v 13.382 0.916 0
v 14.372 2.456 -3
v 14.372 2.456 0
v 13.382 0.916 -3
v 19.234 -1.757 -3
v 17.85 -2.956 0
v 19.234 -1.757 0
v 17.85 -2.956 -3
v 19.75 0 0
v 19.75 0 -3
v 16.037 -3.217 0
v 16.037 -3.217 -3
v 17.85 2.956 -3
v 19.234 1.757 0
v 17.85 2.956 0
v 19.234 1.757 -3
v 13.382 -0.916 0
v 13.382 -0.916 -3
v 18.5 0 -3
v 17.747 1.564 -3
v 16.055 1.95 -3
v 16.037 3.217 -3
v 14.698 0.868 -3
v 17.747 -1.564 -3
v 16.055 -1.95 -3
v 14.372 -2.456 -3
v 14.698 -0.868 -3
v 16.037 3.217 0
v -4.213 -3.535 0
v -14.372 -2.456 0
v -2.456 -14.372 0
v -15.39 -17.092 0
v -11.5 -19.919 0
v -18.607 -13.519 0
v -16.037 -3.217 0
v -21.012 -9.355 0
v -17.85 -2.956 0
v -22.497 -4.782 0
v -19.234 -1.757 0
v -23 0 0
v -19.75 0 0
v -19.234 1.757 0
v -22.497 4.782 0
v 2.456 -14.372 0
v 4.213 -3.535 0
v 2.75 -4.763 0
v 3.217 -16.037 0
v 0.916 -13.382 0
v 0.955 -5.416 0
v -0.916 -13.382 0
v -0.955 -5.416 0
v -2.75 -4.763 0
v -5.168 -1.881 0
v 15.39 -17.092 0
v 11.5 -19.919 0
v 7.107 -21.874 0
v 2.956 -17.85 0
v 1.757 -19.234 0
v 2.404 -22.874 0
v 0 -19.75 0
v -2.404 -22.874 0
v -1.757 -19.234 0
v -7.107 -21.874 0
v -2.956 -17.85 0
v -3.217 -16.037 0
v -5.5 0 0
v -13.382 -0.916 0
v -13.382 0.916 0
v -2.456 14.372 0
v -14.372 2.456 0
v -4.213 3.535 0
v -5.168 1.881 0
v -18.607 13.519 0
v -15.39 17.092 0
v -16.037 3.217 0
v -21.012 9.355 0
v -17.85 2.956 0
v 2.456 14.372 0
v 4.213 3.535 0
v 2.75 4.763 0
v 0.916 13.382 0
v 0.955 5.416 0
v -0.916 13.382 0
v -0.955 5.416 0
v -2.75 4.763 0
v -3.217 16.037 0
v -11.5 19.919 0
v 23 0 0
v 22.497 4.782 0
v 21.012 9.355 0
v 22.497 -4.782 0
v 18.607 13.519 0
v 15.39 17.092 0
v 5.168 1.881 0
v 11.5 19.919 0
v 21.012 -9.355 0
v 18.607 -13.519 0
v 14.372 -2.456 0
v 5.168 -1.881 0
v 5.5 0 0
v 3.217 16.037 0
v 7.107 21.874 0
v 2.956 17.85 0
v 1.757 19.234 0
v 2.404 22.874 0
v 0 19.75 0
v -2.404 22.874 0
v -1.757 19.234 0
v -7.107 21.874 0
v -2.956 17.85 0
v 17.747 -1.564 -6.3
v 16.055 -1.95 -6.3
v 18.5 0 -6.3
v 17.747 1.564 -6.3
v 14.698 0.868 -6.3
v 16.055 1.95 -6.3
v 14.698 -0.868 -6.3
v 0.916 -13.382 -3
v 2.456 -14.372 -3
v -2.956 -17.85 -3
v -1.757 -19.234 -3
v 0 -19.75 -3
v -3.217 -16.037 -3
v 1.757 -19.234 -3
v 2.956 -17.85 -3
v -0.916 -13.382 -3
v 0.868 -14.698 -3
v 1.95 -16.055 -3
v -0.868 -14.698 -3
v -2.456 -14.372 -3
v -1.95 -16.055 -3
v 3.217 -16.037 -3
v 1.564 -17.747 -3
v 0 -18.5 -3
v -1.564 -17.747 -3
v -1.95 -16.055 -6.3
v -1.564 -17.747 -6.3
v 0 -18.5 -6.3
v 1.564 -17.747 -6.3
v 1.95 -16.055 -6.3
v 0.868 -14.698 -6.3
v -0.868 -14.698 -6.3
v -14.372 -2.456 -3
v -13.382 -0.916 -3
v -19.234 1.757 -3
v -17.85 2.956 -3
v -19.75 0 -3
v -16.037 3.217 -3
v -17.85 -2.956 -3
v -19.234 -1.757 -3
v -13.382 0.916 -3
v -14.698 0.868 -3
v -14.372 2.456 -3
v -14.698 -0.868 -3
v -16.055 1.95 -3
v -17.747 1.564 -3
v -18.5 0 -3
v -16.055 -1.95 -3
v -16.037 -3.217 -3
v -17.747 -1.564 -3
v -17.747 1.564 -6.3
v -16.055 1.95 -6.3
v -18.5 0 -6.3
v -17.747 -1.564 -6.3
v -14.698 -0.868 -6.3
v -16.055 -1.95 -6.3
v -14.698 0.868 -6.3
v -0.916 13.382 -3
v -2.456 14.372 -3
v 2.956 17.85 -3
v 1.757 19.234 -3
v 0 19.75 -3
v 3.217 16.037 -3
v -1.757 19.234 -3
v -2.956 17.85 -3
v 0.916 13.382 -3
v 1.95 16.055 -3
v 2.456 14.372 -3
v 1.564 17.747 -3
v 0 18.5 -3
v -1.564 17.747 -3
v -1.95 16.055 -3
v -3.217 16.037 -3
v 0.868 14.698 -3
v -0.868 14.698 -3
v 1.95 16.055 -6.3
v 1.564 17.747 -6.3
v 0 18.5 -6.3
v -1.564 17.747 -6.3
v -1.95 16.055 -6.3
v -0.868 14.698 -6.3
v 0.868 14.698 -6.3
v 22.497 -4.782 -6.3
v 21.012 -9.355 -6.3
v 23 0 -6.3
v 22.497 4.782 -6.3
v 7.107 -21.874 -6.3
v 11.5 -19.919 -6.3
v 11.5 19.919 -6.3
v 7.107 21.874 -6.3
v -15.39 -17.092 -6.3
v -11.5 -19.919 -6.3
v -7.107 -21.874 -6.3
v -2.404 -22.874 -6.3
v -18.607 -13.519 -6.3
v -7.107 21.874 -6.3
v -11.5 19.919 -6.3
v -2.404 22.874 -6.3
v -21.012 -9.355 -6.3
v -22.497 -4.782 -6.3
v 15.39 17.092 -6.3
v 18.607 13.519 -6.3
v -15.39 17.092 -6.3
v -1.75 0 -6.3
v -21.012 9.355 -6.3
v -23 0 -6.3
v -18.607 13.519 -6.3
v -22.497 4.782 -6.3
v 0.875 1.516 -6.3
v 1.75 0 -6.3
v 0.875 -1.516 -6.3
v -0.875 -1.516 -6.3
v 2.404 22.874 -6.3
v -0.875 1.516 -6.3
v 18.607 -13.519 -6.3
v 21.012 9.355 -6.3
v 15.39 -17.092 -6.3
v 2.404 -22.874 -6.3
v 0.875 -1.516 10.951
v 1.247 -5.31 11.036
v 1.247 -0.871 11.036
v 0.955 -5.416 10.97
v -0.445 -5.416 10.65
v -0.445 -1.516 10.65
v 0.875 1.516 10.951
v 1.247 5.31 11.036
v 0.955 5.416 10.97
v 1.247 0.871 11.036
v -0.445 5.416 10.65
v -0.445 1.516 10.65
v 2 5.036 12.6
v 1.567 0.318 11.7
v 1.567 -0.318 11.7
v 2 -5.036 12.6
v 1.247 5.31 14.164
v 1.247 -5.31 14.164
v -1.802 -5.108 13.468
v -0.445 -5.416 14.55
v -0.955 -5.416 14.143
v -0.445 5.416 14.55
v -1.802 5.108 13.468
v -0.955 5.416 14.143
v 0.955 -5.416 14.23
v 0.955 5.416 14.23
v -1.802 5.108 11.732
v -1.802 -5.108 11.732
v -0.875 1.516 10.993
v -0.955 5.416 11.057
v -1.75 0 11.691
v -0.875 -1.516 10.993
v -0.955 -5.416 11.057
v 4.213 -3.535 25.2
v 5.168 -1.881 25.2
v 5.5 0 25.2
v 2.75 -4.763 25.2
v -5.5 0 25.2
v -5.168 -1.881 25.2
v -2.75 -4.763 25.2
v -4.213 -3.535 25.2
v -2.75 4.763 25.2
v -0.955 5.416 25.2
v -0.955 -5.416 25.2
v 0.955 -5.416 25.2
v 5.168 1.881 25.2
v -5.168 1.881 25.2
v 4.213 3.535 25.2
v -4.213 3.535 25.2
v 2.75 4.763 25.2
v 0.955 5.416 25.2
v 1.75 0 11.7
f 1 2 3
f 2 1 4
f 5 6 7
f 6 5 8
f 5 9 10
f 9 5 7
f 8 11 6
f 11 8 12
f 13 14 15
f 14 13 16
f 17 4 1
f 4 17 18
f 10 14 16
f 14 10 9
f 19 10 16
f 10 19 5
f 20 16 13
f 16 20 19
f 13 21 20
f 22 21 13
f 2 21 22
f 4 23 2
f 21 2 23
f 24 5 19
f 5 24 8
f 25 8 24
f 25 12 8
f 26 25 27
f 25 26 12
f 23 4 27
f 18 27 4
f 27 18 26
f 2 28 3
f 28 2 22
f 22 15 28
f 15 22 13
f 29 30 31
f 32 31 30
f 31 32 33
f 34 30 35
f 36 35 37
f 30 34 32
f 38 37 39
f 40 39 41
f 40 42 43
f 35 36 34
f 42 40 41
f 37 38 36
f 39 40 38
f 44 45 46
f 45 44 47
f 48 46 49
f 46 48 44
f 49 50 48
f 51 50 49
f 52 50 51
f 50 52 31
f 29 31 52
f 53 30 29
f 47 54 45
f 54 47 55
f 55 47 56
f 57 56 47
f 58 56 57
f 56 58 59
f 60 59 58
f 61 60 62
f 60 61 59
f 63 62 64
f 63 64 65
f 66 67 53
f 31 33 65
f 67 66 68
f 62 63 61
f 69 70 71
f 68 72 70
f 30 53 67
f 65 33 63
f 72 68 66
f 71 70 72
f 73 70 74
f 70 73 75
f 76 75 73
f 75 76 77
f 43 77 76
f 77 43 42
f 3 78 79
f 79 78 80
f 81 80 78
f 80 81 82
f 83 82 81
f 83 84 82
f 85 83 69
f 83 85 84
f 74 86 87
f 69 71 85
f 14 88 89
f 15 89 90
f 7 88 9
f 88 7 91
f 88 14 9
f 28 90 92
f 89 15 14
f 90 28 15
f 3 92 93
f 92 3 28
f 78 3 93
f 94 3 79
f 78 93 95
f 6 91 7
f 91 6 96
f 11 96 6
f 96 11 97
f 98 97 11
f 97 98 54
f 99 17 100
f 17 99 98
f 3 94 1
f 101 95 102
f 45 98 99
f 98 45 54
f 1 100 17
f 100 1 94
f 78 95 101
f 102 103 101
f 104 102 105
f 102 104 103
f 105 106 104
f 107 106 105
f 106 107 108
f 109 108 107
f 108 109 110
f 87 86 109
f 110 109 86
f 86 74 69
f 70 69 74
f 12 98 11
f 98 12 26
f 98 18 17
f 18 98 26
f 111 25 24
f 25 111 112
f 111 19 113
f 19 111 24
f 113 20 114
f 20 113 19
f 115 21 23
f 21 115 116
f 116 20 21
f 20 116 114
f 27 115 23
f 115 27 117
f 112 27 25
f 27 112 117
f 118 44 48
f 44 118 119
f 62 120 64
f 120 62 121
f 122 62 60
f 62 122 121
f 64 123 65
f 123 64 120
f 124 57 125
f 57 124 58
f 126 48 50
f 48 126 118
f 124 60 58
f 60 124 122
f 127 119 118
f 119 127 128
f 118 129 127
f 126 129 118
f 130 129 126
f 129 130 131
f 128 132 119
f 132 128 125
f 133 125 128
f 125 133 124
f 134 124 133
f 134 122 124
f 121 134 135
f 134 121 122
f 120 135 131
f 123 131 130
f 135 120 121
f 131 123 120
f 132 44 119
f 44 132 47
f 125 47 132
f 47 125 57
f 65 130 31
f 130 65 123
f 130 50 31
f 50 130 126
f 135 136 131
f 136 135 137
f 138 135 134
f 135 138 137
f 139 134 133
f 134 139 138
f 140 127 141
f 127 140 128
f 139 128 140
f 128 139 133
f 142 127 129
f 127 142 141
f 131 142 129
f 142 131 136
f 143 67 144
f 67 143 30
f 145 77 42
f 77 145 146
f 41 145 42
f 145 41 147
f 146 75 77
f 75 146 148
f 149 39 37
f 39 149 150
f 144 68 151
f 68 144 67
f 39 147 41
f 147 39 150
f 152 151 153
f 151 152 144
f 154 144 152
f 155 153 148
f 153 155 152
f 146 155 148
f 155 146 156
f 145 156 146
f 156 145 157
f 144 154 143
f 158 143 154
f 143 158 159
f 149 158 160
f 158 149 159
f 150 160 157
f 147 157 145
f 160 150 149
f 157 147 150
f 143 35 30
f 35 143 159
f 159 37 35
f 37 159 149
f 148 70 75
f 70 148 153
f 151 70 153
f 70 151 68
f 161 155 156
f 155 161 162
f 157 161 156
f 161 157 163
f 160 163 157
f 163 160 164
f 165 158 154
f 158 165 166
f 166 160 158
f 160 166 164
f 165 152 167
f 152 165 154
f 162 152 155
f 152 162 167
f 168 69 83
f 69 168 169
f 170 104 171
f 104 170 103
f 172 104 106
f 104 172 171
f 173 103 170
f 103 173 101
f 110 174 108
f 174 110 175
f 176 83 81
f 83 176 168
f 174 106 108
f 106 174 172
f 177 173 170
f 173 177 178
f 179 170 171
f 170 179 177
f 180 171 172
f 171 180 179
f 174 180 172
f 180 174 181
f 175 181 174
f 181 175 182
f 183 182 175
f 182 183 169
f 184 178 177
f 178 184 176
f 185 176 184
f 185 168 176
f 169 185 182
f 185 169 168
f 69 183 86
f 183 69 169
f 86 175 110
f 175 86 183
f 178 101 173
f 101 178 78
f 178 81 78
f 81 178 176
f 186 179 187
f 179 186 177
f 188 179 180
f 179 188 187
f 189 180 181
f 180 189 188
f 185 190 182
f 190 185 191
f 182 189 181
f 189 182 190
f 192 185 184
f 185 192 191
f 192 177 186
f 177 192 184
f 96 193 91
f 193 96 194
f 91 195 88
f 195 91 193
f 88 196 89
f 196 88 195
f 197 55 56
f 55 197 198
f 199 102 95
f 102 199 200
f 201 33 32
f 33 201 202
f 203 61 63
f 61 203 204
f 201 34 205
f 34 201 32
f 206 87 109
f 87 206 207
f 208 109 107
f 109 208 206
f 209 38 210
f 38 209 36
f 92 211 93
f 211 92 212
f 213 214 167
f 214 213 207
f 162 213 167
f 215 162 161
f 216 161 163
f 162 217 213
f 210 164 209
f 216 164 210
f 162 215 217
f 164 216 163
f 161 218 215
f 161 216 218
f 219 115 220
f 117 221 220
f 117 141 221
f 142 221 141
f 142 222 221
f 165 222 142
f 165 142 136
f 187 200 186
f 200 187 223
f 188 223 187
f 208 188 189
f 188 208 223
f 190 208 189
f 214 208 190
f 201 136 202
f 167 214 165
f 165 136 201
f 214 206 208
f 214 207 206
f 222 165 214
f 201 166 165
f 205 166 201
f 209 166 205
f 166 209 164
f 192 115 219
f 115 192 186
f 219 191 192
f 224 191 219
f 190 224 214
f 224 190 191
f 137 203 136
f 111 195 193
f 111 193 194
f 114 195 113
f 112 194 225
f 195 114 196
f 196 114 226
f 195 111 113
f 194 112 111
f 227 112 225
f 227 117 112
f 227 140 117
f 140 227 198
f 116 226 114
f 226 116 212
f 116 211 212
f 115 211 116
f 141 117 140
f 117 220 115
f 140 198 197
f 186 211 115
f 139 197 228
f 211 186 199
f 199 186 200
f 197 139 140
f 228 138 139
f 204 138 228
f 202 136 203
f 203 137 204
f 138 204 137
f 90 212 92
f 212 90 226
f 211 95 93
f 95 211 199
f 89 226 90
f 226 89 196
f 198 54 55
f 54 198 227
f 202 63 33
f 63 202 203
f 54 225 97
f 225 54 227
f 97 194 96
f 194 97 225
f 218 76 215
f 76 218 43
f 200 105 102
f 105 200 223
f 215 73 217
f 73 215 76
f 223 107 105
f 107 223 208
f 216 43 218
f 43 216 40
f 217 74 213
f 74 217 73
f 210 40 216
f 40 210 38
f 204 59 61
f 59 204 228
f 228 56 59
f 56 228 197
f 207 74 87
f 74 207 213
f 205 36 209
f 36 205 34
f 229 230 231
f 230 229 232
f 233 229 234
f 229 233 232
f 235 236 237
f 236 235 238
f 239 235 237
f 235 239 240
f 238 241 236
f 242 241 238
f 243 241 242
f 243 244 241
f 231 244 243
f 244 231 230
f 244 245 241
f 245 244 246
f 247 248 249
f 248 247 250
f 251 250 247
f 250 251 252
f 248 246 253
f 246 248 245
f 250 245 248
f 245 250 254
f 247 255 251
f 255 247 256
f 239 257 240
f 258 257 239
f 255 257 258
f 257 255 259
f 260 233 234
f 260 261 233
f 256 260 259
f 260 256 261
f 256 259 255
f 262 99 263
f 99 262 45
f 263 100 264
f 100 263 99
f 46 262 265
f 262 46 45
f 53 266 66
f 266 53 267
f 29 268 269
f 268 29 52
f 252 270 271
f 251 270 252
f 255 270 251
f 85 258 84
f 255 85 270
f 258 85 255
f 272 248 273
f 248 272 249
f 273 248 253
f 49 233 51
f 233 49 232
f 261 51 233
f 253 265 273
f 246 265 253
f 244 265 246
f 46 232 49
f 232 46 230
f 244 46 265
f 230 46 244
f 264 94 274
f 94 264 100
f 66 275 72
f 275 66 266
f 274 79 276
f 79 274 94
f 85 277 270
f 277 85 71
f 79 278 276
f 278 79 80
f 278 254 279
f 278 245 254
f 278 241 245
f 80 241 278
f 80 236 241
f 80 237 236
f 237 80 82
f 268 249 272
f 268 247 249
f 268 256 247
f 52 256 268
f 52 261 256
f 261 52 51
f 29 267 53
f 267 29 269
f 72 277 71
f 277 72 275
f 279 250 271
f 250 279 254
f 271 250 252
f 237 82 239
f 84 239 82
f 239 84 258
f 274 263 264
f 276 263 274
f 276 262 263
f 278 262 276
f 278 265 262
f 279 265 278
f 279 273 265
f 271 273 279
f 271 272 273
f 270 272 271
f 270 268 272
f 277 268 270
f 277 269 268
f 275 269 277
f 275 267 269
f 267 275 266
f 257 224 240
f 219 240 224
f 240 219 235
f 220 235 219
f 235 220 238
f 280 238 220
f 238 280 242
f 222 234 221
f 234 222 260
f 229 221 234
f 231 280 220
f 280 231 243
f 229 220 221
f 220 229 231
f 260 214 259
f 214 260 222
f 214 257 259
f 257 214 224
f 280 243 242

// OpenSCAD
// file: hardware.scad
axle_r = 4.5;
axle_separation = 30;

module axle(h) {
	rotate(v=[-1,0,0], a=90) cylinder(r=axle_r, h=h, $fn=10);
}

module axlepair(h=100) {
	union() {
		axle(h);
		translate(v=[axle_separation, 0, 0]) axle(h);
	}
}

module m2(h=16) {
	union() {
		cylinder(r=2, h=2);
		cylinder(r=1.5, h=h);
	}
}

module m3(h=16) {
	union() {
		cylinder(r=3.25, h=3);
		cylinder(r=2, h=h);
	}
}

module m5(h=16) {
	union() {
		cylinder(r=4.5, h=5);
		cylinder(r=3, h=h);
	}
}
// main file
use <hardware.scad>

module stanley(solid_screw = false) {
    motor_r = 23;
    stem_r = 5.5;
    retainer_r = stem_r;
    motor_disk_height = 6.3;
    screw_count = 4;
		stem_height = motor_disk_height * 3;
		back_axle_length = 18;

    difference () {
				union() {
						difference() {
								cylinder(r=motor_r, h=motor_disk_height);
								for (i = [0:screw_count-1]) {
										rotate(v=[0,0,1], a = i * 360 / screw_count) {
												translate(v=[16.5, 0, 0]) m3();
										}
								}
						}
	
						difference() {
								translate(v=[0, 0, -stem_height]) {
										cylinder(r=stem_r, h=stem_height);
								}
								
								if (!solid_screw) {
										translate(v=[0, 10, -stem_height + motor_disk_height]) {
												rotate (v=[1, 0, 0], 90) m3(40);
										}
								}
						}

						translate(v=[0, 0, -motor_disk_height - stem_height]) {
								cylinder(r=retainer_r, h=motor_disk_height);
						}

						if (solid_screw) {
								translate(v=[0, 20, -motor_disk_height]) {
										rotate (v=[1, 0, 0], 90) m3(40);
								}
						}
				}

				translate(v=[0, 0, -back_axle_length + motor_disk_height]) {
						cylinder(h=back_axle_length, r=1.75);
				}
		}
}			

rotate(v=[1,0,0], 180) stanley();
